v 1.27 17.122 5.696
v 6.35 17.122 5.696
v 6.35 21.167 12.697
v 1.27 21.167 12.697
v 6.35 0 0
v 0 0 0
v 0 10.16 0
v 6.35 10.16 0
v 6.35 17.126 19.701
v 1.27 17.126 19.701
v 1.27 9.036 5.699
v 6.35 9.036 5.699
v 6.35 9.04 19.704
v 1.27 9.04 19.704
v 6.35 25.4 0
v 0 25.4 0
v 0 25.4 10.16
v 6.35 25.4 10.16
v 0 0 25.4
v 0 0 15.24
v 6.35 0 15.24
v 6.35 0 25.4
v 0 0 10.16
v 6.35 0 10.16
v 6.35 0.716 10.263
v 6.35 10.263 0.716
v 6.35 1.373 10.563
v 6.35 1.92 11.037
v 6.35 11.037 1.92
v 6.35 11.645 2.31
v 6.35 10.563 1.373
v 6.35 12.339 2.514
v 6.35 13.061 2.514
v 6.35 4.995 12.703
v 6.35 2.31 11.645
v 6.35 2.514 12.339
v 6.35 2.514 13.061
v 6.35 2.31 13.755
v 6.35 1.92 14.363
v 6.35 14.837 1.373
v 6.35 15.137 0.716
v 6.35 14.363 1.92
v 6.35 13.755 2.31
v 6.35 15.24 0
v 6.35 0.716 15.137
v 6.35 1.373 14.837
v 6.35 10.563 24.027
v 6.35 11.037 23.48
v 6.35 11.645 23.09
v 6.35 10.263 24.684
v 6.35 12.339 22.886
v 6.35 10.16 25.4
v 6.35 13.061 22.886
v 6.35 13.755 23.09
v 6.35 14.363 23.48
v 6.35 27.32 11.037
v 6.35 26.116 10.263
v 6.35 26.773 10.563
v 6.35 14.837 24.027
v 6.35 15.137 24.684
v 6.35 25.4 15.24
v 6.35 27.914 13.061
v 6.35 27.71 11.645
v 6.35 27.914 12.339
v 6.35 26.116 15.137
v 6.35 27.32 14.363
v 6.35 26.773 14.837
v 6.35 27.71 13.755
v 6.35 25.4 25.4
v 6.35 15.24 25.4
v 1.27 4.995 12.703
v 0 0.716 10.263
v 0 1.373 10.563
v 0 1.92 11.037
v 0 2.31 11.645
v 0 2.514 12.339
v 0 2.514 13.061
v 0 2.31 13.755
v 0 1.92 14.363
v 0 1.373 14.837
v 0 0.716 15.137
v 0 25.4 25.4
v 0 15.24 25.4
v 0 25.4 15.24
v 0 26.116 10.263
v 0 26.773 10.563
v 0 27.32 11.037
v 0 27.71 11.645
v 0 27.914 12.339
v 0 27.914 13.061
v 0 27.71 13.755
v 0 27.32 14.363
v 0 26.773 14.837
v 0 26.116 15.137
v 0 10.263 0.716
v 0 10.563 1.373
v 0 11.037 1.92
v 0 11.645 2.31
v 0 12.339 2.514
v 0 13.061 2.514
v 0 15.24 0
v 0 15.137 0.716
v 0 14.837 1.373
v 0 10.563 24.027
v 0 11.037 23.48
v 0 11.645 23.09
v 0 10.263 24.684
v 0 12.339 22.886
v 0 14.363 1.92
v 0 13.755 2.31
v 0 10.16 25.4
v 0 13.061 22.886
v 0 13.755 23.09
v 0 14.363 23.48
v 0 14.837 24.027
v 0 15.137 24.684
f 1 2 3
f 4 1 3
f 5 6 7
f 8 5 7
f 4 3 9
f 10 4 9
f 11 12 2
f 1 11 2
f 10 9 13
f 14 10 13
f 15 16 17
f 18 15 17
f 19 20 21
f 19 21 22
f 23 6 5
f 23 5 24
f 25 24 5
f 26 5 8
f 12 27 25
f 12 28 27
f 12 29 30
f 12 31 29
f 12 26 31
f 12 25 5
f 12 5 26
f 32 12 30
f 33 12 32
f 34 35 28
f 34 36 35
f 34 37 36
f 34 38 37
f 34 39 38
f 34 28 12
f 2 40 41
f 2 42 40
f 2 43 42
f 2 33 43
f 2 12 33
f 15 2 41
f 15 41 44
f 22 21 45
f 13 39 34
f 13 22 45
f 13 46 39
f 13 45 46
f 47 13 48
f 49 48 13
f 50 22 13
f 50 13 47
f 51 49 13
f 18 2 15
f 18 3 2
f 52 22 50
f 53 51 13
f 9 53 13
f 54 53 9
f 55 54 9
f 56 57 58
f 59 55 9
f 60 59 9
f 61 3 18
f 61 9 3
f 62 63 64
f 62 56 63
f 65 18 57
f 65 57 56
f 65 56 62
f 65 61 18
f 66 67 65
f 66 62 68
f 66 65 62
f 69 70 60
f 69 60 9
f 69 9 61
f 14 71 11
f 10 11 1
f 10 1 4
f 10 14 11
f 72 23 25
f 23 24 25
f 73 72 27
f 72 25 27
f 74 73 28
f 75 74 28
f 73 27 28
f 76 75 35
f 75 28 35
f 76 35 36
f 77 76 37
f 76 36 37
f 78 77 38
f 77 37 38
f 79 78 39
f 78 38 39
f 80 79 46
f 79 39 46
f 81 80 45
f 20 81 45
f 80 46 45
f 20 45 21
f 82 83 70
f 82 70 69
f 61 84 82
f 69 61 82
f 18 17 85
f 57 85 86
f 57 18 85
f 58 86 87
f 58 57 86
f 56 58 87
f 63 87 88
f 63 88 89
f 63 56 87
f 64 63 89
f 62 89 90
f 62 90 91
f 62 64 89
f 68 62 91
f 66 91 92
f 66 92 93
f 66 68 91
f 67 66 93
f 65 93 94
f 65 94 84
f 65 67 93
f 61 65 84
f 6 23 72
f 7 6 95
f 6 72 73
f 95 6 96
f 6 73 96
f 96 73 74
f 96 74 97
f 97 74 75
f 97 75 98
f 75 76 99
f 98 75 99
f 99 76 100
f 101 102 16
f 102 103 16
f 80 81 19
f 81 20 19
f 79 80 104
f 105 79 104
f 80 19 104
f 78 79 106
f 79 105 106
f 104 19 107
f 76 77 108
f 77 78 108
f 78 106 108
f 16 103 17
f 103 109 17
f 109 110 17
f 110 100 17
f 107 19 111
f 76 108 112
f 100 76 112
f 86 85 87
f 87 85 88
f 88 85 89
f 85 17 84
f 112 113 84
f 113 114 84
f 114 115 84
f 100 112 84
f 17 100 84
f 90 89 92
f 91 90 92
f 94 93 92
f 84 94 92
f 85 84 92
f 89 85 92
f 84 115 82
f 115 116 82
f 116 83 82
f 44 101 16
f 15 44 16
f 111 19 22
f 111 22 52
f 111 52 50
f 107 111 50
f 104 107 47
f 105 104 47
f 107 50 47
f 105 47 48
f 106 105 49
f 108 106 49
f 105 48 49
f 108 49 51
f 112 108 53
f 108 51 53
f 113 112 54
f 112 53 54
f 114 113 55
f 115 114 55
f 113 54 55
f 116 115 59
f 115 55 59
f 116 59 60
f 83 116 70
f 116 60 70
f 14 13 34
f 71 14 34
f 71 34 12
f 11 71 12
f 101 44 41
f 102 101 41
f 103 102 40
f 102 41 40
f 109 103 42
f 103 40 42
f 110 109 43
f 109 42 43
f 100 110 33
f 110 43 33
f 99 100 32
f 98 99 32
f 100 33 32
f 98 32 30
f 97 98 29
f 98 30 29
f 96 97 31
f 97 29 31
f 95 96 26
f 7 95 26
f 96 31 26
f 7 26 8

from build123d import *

# Parameters (mm, degrees)
F0_W     = 25.4
F0_H     = 25.4
F1_DEPTH = 6.35
F2_R     = 2.54
F3_DEPTH = 6.35
F4_R     = 2.54
F5_DEPTH = 6.35
F7_DEPTH = 5.08


with BuildPart() as f1:
    # F0 (on Right) → F1 (new body)
    with BuildSketch(Plane.YZ):
        with Locations((12.7, 12.7)):
            Rectangle(F0_W, F0_H)
    extrude(amount=F1_DEPTH)

    # F2 (on face) → F3 (cut)
    with BuildSketch(Plane.YZ.offset(6.35)):
        with Locations((12.7, 0)):
            Circle(F2_R)
        with Locations((0, 12.7)):
            Circle(F2_R)
        with Locations((12.7, 25.4)):
            Circle(F2_R)
    extrude(amount=-F3_DEPTH, mode=Mode.SUBTRACT)

    # F4 (on face) → F5 (join)
    with BuildSketch(Plane.YZ.offset(6.35)):
        with Locations((25.4, 12.7)):
            Circle(F4_R)
    extrude(amount=-F5_DEPTH)

    # F6 (on face) → F7 (cut)
    with BuildSketch(Plane.YZ.offset(6.35)):
        Polygon((21.166794, 12.697409), (17.12614, 19.701207), (9.040347, 19.703798), (4.995206, 12.702591), (9.03586, 5.698793), (17.121653, 5.696202), align=None)
    extrude(amount=-F7_DEPTH, mode=Mode.SUBTRACT)


solid = f1.part
